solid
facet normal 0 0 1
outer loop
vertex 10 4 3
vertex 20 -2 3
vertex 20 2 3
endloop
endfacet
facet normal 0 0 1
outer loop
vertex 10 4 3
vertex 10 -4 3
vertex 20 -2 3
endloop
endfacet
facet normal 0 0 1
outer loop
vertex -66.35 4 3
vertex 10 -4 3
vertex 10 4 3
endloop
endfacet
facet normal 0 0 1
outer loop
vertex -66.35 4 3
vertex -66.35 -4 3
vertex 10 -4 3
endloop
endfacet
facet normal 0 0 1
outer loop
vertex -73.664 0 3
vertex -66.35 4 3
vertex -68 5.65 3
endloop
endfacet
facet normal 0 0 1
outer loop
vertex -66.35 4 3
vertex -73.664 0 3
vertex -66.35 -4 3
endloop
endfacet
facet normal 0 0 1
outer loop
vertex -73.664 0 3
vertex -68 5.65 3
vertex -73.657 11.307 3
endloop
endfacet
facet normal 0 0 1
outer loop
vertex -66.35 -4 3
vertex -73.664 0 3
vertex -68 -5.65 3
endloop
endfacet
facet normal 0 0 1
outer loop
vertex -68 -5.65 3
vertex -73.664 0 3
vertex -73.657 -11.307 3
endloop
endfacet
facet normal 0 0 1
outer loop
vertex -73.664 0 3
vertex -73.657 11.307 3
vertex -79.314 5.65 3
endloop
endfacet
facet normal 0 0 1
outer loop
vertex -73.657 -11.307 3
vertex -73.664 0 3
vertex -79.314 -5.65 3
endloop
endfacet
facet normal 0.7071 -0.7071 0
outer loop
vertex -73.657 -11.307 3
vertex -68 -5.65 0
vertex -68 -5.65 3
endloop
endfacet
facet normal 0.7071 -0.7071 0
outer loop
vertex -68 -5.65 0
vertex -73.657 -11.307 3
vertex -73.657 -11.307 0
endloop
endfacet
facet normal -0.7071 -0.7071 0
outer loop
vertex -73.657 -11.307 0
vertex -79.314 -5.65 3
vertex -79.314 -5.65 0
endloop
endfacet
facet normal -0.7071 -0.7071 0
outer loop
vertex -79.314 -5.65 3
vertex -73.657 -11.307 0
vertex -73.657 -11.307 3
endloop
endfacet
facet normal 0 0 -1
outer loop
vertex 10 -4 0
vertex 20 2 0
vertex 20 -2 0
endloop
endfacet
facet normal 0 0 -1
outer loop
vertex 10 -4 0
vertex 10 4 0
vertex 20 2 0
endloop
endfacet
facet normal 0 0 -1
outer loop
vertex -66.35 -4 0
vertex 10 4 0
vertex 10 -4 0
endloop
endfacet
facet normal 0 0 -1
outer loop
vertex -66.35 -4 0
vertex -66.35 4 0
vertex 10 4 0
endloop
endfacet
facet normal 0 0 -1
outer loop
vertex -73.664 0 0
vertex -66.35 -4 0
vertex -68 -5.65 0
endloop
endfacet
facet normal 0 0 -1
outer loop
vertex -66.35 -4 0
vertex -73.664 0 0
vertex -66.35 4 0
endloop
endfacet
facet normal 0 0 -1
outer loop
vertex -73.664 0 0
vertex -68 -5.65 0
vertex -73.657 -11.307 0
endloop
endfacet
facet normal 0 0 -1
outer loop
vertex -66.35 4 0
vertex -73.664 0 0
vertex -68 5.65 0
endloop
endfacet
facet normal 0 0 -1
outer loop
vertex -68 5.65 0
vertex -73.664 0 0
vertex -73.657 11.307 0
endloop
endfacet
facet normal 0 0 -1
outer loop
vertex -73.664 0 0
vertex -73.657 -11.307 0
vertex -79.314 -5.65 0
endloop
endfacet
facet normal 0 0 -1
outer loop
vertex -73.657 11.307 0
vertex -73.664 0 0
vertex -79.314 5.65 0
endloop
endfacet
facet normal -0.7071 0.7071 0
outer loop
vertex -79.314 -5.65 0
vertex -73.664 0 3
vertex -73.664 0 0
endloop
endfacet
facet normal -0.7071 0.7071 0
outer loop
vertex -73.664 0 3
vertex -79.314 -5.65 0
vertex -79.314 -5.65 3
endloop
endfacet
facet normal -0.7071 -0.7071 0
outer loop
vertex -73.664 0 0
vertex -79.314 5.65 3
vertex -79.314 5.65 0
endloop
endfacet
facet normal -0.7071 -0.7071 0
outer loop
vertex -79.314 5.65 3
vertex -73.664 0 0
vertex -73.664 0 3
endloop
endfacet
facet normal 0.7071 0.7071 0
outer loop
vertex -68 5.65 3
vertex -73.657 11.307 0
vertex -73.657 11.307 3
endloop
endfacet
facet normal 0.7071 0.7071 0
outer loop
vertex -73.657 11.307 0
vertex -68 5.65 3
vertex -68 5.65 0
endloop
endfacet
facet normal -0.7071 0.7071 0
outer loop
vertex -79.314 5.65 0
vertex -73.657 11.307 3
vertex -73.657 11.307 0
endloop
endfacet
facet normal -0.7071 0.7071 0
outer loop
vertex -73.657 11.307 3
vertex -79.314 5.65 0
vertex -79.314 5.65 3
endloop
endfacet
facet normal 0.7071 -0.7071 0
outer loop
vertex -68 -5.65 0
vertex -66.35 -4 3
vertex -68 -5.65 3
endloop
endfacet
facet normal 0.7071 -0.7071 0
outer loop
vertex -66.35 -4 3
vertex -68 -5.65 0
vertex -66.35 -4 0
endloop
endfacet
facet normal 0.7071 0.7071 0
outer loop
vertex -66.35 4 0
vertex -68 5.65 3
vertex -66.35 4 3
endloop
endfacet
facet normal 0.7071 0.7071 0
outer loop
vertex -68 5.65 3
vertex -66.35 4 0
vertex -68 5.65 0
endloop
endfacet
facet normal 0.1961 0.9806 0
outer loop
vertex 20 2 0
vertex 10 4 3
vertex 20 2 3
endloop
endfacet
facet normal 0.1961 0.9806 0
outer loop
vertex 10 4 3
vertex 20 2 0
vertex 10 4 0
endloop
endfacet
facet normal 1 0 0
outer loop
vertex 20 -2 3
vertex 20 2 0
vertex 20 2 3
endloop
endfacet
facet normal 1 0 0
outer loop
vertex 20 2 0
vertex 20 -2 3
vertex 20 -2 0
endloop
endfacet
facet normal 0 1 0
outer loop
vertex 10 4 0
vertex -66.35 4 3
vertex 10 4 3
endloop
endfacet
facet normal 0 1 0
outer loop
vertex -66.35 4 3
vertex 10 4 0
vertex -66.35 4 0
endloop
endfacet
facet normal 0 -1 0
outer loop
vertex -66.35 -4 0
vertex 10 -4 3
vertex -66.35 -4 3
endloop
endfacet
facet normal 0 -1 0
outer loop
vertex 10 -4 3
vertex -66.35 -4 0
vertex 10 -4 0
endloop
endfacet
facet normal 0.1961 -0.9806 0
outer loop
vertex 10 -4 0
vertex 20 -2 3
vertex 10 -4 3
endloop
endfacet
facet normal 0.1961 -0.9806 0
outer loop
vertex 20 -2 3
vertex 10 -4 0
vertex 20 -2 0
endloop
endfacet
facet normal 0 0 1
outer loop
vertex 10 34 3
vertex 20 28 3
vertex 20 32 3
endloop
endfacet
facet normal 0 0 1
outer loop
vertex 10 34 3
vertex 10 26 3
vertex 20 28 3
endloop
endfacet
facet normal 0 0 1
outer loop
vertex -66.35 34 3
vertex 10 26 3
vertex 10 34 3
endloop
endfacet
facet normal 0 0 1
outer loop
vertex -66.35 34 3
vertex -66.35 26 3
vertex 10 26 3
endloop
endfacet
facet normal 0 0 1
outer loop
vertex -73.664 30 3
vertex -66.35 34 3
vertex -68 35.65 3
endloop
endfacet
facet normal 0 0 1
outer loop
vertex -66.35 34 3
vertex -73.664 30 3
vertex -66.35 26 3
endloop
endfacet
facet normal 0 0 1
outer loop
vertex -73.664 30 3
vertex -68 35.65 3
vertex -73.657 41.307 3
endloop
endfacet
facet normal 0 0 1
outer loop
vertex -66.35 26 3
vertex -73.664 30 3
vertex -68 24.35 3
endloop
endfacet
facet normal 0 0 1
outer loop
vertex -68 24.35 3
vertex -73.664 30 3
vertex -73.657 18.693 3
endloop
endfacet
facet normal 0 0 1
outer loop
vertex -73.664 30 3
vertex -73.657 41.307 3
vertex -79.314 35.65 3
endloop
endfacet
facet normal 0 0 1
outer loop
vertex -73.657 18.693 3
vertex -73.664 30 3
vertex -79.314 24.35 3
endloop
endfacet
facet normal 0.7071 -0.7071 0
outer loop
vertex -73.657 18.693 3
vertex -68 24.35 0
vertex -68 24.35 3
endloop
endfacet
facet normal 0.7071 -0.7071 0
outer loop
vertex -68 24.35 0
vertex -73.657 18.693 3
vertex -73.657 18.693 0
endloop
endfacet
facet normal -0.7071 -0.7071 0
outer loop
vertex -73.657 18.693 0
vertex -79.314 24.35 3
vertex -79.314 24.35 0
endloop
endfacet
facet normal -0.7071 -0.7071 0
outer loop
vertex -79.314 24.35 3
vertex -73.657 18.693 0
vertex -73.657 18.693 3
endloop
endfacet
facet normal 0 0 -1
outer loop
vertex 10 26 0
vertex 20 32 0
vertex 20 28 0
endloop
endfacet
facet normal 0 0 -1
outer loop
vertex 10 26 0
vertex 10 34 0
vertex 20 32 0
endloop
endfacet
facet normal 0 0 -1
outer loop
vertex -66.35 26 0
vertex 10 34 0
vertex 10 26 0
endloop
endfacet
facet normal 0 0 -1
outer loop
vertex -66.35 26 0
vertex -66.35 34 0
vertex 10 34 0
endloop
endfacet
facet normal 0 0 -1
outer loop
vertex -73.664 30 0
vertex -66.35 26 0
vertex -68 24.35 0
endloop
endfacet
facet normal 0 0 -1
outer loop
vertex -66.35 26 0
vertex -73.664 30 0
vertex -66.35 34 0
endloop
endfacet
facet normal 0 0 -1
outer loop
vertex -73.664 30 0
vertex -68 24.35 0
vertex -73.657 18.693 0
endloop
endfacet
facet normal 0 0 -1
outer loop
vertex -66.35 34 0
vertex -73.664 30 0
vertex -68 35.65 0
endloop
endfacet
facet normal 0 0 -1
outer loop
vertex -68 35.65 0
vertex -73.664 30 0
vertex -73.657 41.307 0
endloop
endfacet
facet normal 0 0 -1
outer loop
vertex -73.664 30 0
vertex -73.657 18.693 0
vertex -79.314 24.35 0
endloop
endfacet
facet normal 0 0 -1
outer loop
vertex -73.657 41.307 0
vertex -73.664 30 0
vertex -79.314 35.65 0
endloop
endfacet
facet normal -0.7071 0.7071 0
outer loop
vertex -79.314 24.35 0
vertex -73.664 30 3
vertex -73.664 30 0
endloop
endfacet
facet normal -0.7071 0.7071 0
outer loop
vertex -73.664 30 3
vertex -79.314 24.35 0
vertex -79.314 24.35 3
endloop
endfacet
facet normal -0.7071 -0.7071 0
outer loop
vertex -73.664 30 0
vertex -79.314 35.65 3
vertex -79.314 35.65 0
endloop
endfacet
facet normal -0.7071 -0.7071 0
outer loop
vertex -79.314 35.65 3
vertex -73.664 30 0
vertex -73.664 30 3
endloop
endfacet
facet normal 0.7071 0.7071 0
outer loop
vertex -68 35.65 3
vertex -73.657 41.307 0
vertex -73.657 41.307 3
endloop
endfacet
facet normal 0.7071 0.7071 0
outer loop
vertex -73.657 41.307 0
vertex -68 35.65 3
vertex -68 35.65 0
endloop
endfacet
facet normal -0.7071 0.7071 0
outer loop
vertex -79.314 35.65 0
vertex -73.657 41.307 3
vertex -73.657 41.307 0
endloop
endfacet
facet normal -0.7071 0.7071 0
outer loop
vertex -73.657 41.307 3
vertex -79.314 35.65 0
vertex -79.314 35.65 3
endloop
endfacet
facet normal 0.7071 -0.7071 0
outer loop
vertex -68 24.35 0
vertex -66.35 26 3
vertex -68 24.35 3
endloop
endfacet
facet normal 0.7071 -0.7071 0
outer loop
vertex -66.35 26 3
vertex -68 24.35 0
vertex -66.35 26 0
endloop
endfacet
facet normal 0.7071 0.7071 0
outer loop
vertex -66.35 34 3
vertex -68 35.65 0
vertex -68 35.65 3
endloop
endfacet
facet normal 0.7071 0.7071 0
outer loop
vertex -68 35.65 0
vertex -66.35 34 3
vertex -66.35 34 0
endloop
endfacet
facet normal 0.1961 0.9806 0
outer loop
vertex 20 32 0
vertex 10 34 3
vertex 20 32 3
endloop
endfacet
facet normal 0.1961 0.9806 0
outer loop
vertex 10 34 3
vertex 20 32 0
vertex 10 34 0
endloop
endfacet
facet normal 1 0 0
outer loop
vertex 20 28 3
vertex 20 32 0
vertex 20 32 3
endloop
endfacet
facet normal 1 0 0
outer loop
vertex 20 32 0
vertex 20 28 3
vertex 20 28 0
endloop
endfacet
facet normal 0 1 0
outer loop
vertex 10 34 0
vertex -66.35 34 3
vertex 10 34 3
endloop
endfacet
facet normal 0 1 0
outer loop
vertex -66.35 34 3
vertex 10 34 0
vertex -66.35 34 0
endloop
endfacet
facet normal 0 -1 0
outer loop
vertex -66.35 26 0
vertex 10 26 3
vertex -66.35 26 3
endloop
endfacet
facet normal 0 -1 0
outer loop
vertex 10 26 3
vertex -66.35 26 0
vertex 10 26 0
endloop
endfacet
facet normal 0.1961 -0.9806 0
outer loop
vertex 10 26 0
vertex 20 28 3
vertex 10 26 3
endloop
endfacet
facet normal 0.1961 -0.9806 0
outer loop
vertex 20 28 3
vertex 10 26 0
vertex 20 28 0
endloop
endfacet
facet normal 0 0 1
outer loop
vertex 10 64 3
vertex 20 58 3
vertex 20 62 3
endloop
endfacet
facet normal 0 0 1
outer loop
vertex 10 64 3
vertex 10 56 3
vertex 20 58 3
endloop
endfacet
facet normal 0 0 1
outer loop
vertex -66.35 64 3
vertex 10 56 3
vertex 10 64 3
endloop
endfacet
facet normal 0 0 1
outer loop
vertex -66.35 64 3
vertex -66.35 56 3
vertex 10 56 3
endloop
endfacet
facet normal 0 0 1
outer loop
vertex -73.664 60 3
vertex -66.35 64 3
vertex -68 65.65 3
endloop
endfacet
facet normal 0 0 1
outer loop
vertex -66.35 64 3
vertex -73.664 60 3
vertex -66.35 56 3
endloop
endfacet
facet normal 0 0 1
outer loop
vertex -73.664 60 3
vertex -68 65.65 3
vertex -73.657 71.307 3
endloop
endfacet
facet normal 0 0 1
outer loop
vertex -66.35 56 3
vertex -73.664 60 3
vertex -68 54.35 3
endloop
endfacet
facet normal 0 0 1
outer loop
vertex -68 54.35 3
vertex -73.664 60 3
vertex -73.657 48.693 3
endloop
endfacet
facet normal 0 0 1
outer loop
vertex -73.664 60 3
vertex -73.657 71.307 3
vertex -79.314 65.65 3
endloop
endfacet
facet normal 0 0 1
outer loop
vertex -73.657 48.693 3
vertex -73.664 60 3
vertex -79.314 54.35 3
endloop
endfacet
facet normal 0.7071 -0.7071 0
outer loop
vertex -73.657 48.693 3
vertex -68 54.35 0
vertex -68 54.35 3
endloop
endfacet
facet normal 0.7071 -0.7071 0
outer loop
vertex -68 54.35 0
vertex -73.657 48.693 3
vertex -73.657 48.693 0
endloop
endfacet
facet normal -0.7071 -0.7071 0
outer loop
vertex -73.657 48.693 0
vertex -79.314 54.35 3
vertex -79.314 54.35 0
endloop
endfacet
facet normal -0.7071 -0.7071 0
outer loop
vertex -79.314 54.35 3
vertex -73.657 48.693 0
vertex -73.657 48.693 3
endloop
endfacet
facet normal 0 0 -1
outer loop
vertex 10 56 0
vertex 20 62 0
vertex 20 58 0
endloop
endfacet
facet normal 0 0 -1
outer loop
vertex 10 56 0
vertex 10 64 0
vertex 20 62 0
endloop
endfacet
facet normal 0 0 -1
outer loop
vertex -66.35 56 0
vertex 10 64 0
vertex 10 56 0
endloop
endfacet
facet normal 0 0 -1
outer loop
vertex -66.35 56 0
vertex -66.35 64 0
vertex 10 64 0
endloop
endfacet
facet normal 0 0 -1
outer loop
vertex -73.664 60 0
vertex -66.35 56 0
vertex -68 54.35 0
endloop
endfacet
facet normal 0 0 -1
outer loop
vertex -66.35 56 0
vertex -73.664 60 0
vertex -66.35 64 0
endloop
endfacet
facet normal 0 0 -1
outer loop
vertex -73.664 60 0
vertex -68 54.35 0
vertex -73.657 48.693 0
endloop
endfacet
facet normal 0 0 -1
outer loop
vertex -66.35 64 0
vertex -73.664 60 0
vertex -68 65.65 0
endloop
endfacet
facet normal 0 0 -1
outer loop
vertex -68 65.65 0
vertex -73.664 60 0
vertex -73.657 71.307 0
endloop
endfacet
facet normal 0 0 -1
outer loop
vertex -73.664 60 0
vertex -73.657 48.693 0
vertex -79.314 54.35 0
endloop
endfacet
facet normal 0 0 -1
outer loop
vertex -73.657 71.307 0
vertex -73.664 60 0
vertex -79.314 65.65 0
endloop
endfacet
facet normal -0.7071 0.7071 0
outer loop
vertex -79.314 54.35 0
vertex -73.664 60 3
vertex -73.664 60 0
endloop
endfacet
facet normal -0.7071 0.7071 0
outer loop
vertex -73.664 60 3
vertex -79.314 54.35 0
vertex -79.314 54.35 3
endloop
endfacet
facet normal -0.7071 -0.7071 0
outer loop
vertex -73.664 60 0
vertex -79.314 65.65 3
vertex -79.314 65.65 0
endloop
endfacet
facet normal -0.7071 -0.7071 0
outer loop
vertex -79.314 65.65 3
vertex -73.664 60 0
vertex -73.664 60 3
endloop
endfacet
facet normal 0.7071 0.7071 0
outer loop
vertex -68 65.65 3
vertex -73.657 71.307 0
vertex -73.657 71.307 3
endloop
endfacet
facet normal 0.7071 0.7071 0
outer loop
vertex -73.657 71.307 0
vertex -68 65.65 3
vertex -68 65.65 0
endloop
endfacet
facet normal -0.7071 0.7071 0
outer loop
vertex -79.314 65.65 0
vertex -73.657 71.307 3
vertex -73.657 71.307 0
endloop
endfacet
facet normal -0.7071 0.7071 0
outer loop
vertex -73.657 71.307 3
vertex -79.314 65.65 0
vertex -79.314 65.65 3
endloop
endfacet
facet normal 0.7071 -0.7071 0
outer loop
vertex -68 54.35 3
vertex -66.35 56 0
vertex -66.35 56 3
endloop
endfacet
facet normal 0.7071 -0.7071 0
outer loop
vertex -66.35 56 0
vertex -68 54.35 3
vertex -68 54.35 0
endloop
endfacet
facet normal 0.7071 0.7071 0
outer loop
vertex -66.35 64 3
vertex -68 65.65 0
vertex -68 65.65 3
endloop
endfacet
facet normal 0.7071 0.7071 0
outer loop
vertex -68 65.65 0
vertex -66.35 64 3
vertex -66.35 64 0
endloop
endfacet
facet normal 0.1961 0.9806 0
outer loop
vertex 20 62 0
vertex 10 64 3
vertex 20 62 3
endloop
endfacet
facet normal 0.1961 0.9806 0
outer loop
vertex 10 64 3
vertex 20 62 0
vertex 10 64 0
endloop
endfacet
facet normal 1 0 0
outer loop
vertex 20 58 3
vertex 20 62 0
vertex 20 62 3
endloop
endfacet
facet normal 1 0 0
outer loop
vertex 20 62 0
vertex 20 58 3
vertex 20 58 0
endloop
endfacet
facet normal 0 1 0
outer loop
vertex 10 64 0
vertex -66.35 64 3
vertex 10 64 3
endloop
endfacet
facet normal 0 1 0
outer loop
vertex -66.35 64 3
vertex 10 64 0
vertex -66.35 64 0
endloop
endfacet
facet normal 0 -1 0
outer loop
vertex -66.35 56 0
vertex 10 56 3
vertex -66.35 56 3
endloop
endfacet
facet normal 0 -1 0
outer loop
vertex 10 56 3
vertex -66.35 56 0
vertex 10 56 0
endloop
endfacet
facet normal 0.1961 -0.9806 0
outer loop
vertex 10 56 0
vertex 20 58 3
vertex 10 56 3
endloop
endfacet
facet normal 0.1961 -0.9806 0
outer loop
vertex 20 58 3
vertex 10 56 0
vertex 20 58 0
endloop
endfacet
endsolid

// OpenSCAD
h = 3; 
// tip vars
tw = 8; 

// arm vars
aw = 8;
al = 68; 

// head vars 
hl = 10; 

// length of tip is 20mm
module tip() {  
    hull() { 
       translate([10, -tw/4, 0]) cube([10, tw/2, h]); 
       translate([0, -tw/2, 0]) cube([10, tw, h]); 
    }
} 


module arm() { 
     cube([al, aw, h]); 
}

// approx 11mm
module head() { 
    rotate([0,0, 90])
    union() { 
        translate([-5.65,0,0])
        rotate([0, 0, 45]) 
        cube([aw, aw, h]); 
        
        translate([5.65,0,0])
        rotate([0, 0, 45]) 
        cube([aw, aw, h]); 
        
        translate([0,-5.65,0])
        rotate([0, 0, 45]) 
        cube([aw, aw, h]);
    }
}

module support() { 
    tip(); 
    translate([-al, -aw/2, 0]) arm(); 
    translate([-al, 0, 0]) head(); 
}

for (i=[0: 1: 2])  { 
    translate([0, 30*i, 0]) support(); 
}
